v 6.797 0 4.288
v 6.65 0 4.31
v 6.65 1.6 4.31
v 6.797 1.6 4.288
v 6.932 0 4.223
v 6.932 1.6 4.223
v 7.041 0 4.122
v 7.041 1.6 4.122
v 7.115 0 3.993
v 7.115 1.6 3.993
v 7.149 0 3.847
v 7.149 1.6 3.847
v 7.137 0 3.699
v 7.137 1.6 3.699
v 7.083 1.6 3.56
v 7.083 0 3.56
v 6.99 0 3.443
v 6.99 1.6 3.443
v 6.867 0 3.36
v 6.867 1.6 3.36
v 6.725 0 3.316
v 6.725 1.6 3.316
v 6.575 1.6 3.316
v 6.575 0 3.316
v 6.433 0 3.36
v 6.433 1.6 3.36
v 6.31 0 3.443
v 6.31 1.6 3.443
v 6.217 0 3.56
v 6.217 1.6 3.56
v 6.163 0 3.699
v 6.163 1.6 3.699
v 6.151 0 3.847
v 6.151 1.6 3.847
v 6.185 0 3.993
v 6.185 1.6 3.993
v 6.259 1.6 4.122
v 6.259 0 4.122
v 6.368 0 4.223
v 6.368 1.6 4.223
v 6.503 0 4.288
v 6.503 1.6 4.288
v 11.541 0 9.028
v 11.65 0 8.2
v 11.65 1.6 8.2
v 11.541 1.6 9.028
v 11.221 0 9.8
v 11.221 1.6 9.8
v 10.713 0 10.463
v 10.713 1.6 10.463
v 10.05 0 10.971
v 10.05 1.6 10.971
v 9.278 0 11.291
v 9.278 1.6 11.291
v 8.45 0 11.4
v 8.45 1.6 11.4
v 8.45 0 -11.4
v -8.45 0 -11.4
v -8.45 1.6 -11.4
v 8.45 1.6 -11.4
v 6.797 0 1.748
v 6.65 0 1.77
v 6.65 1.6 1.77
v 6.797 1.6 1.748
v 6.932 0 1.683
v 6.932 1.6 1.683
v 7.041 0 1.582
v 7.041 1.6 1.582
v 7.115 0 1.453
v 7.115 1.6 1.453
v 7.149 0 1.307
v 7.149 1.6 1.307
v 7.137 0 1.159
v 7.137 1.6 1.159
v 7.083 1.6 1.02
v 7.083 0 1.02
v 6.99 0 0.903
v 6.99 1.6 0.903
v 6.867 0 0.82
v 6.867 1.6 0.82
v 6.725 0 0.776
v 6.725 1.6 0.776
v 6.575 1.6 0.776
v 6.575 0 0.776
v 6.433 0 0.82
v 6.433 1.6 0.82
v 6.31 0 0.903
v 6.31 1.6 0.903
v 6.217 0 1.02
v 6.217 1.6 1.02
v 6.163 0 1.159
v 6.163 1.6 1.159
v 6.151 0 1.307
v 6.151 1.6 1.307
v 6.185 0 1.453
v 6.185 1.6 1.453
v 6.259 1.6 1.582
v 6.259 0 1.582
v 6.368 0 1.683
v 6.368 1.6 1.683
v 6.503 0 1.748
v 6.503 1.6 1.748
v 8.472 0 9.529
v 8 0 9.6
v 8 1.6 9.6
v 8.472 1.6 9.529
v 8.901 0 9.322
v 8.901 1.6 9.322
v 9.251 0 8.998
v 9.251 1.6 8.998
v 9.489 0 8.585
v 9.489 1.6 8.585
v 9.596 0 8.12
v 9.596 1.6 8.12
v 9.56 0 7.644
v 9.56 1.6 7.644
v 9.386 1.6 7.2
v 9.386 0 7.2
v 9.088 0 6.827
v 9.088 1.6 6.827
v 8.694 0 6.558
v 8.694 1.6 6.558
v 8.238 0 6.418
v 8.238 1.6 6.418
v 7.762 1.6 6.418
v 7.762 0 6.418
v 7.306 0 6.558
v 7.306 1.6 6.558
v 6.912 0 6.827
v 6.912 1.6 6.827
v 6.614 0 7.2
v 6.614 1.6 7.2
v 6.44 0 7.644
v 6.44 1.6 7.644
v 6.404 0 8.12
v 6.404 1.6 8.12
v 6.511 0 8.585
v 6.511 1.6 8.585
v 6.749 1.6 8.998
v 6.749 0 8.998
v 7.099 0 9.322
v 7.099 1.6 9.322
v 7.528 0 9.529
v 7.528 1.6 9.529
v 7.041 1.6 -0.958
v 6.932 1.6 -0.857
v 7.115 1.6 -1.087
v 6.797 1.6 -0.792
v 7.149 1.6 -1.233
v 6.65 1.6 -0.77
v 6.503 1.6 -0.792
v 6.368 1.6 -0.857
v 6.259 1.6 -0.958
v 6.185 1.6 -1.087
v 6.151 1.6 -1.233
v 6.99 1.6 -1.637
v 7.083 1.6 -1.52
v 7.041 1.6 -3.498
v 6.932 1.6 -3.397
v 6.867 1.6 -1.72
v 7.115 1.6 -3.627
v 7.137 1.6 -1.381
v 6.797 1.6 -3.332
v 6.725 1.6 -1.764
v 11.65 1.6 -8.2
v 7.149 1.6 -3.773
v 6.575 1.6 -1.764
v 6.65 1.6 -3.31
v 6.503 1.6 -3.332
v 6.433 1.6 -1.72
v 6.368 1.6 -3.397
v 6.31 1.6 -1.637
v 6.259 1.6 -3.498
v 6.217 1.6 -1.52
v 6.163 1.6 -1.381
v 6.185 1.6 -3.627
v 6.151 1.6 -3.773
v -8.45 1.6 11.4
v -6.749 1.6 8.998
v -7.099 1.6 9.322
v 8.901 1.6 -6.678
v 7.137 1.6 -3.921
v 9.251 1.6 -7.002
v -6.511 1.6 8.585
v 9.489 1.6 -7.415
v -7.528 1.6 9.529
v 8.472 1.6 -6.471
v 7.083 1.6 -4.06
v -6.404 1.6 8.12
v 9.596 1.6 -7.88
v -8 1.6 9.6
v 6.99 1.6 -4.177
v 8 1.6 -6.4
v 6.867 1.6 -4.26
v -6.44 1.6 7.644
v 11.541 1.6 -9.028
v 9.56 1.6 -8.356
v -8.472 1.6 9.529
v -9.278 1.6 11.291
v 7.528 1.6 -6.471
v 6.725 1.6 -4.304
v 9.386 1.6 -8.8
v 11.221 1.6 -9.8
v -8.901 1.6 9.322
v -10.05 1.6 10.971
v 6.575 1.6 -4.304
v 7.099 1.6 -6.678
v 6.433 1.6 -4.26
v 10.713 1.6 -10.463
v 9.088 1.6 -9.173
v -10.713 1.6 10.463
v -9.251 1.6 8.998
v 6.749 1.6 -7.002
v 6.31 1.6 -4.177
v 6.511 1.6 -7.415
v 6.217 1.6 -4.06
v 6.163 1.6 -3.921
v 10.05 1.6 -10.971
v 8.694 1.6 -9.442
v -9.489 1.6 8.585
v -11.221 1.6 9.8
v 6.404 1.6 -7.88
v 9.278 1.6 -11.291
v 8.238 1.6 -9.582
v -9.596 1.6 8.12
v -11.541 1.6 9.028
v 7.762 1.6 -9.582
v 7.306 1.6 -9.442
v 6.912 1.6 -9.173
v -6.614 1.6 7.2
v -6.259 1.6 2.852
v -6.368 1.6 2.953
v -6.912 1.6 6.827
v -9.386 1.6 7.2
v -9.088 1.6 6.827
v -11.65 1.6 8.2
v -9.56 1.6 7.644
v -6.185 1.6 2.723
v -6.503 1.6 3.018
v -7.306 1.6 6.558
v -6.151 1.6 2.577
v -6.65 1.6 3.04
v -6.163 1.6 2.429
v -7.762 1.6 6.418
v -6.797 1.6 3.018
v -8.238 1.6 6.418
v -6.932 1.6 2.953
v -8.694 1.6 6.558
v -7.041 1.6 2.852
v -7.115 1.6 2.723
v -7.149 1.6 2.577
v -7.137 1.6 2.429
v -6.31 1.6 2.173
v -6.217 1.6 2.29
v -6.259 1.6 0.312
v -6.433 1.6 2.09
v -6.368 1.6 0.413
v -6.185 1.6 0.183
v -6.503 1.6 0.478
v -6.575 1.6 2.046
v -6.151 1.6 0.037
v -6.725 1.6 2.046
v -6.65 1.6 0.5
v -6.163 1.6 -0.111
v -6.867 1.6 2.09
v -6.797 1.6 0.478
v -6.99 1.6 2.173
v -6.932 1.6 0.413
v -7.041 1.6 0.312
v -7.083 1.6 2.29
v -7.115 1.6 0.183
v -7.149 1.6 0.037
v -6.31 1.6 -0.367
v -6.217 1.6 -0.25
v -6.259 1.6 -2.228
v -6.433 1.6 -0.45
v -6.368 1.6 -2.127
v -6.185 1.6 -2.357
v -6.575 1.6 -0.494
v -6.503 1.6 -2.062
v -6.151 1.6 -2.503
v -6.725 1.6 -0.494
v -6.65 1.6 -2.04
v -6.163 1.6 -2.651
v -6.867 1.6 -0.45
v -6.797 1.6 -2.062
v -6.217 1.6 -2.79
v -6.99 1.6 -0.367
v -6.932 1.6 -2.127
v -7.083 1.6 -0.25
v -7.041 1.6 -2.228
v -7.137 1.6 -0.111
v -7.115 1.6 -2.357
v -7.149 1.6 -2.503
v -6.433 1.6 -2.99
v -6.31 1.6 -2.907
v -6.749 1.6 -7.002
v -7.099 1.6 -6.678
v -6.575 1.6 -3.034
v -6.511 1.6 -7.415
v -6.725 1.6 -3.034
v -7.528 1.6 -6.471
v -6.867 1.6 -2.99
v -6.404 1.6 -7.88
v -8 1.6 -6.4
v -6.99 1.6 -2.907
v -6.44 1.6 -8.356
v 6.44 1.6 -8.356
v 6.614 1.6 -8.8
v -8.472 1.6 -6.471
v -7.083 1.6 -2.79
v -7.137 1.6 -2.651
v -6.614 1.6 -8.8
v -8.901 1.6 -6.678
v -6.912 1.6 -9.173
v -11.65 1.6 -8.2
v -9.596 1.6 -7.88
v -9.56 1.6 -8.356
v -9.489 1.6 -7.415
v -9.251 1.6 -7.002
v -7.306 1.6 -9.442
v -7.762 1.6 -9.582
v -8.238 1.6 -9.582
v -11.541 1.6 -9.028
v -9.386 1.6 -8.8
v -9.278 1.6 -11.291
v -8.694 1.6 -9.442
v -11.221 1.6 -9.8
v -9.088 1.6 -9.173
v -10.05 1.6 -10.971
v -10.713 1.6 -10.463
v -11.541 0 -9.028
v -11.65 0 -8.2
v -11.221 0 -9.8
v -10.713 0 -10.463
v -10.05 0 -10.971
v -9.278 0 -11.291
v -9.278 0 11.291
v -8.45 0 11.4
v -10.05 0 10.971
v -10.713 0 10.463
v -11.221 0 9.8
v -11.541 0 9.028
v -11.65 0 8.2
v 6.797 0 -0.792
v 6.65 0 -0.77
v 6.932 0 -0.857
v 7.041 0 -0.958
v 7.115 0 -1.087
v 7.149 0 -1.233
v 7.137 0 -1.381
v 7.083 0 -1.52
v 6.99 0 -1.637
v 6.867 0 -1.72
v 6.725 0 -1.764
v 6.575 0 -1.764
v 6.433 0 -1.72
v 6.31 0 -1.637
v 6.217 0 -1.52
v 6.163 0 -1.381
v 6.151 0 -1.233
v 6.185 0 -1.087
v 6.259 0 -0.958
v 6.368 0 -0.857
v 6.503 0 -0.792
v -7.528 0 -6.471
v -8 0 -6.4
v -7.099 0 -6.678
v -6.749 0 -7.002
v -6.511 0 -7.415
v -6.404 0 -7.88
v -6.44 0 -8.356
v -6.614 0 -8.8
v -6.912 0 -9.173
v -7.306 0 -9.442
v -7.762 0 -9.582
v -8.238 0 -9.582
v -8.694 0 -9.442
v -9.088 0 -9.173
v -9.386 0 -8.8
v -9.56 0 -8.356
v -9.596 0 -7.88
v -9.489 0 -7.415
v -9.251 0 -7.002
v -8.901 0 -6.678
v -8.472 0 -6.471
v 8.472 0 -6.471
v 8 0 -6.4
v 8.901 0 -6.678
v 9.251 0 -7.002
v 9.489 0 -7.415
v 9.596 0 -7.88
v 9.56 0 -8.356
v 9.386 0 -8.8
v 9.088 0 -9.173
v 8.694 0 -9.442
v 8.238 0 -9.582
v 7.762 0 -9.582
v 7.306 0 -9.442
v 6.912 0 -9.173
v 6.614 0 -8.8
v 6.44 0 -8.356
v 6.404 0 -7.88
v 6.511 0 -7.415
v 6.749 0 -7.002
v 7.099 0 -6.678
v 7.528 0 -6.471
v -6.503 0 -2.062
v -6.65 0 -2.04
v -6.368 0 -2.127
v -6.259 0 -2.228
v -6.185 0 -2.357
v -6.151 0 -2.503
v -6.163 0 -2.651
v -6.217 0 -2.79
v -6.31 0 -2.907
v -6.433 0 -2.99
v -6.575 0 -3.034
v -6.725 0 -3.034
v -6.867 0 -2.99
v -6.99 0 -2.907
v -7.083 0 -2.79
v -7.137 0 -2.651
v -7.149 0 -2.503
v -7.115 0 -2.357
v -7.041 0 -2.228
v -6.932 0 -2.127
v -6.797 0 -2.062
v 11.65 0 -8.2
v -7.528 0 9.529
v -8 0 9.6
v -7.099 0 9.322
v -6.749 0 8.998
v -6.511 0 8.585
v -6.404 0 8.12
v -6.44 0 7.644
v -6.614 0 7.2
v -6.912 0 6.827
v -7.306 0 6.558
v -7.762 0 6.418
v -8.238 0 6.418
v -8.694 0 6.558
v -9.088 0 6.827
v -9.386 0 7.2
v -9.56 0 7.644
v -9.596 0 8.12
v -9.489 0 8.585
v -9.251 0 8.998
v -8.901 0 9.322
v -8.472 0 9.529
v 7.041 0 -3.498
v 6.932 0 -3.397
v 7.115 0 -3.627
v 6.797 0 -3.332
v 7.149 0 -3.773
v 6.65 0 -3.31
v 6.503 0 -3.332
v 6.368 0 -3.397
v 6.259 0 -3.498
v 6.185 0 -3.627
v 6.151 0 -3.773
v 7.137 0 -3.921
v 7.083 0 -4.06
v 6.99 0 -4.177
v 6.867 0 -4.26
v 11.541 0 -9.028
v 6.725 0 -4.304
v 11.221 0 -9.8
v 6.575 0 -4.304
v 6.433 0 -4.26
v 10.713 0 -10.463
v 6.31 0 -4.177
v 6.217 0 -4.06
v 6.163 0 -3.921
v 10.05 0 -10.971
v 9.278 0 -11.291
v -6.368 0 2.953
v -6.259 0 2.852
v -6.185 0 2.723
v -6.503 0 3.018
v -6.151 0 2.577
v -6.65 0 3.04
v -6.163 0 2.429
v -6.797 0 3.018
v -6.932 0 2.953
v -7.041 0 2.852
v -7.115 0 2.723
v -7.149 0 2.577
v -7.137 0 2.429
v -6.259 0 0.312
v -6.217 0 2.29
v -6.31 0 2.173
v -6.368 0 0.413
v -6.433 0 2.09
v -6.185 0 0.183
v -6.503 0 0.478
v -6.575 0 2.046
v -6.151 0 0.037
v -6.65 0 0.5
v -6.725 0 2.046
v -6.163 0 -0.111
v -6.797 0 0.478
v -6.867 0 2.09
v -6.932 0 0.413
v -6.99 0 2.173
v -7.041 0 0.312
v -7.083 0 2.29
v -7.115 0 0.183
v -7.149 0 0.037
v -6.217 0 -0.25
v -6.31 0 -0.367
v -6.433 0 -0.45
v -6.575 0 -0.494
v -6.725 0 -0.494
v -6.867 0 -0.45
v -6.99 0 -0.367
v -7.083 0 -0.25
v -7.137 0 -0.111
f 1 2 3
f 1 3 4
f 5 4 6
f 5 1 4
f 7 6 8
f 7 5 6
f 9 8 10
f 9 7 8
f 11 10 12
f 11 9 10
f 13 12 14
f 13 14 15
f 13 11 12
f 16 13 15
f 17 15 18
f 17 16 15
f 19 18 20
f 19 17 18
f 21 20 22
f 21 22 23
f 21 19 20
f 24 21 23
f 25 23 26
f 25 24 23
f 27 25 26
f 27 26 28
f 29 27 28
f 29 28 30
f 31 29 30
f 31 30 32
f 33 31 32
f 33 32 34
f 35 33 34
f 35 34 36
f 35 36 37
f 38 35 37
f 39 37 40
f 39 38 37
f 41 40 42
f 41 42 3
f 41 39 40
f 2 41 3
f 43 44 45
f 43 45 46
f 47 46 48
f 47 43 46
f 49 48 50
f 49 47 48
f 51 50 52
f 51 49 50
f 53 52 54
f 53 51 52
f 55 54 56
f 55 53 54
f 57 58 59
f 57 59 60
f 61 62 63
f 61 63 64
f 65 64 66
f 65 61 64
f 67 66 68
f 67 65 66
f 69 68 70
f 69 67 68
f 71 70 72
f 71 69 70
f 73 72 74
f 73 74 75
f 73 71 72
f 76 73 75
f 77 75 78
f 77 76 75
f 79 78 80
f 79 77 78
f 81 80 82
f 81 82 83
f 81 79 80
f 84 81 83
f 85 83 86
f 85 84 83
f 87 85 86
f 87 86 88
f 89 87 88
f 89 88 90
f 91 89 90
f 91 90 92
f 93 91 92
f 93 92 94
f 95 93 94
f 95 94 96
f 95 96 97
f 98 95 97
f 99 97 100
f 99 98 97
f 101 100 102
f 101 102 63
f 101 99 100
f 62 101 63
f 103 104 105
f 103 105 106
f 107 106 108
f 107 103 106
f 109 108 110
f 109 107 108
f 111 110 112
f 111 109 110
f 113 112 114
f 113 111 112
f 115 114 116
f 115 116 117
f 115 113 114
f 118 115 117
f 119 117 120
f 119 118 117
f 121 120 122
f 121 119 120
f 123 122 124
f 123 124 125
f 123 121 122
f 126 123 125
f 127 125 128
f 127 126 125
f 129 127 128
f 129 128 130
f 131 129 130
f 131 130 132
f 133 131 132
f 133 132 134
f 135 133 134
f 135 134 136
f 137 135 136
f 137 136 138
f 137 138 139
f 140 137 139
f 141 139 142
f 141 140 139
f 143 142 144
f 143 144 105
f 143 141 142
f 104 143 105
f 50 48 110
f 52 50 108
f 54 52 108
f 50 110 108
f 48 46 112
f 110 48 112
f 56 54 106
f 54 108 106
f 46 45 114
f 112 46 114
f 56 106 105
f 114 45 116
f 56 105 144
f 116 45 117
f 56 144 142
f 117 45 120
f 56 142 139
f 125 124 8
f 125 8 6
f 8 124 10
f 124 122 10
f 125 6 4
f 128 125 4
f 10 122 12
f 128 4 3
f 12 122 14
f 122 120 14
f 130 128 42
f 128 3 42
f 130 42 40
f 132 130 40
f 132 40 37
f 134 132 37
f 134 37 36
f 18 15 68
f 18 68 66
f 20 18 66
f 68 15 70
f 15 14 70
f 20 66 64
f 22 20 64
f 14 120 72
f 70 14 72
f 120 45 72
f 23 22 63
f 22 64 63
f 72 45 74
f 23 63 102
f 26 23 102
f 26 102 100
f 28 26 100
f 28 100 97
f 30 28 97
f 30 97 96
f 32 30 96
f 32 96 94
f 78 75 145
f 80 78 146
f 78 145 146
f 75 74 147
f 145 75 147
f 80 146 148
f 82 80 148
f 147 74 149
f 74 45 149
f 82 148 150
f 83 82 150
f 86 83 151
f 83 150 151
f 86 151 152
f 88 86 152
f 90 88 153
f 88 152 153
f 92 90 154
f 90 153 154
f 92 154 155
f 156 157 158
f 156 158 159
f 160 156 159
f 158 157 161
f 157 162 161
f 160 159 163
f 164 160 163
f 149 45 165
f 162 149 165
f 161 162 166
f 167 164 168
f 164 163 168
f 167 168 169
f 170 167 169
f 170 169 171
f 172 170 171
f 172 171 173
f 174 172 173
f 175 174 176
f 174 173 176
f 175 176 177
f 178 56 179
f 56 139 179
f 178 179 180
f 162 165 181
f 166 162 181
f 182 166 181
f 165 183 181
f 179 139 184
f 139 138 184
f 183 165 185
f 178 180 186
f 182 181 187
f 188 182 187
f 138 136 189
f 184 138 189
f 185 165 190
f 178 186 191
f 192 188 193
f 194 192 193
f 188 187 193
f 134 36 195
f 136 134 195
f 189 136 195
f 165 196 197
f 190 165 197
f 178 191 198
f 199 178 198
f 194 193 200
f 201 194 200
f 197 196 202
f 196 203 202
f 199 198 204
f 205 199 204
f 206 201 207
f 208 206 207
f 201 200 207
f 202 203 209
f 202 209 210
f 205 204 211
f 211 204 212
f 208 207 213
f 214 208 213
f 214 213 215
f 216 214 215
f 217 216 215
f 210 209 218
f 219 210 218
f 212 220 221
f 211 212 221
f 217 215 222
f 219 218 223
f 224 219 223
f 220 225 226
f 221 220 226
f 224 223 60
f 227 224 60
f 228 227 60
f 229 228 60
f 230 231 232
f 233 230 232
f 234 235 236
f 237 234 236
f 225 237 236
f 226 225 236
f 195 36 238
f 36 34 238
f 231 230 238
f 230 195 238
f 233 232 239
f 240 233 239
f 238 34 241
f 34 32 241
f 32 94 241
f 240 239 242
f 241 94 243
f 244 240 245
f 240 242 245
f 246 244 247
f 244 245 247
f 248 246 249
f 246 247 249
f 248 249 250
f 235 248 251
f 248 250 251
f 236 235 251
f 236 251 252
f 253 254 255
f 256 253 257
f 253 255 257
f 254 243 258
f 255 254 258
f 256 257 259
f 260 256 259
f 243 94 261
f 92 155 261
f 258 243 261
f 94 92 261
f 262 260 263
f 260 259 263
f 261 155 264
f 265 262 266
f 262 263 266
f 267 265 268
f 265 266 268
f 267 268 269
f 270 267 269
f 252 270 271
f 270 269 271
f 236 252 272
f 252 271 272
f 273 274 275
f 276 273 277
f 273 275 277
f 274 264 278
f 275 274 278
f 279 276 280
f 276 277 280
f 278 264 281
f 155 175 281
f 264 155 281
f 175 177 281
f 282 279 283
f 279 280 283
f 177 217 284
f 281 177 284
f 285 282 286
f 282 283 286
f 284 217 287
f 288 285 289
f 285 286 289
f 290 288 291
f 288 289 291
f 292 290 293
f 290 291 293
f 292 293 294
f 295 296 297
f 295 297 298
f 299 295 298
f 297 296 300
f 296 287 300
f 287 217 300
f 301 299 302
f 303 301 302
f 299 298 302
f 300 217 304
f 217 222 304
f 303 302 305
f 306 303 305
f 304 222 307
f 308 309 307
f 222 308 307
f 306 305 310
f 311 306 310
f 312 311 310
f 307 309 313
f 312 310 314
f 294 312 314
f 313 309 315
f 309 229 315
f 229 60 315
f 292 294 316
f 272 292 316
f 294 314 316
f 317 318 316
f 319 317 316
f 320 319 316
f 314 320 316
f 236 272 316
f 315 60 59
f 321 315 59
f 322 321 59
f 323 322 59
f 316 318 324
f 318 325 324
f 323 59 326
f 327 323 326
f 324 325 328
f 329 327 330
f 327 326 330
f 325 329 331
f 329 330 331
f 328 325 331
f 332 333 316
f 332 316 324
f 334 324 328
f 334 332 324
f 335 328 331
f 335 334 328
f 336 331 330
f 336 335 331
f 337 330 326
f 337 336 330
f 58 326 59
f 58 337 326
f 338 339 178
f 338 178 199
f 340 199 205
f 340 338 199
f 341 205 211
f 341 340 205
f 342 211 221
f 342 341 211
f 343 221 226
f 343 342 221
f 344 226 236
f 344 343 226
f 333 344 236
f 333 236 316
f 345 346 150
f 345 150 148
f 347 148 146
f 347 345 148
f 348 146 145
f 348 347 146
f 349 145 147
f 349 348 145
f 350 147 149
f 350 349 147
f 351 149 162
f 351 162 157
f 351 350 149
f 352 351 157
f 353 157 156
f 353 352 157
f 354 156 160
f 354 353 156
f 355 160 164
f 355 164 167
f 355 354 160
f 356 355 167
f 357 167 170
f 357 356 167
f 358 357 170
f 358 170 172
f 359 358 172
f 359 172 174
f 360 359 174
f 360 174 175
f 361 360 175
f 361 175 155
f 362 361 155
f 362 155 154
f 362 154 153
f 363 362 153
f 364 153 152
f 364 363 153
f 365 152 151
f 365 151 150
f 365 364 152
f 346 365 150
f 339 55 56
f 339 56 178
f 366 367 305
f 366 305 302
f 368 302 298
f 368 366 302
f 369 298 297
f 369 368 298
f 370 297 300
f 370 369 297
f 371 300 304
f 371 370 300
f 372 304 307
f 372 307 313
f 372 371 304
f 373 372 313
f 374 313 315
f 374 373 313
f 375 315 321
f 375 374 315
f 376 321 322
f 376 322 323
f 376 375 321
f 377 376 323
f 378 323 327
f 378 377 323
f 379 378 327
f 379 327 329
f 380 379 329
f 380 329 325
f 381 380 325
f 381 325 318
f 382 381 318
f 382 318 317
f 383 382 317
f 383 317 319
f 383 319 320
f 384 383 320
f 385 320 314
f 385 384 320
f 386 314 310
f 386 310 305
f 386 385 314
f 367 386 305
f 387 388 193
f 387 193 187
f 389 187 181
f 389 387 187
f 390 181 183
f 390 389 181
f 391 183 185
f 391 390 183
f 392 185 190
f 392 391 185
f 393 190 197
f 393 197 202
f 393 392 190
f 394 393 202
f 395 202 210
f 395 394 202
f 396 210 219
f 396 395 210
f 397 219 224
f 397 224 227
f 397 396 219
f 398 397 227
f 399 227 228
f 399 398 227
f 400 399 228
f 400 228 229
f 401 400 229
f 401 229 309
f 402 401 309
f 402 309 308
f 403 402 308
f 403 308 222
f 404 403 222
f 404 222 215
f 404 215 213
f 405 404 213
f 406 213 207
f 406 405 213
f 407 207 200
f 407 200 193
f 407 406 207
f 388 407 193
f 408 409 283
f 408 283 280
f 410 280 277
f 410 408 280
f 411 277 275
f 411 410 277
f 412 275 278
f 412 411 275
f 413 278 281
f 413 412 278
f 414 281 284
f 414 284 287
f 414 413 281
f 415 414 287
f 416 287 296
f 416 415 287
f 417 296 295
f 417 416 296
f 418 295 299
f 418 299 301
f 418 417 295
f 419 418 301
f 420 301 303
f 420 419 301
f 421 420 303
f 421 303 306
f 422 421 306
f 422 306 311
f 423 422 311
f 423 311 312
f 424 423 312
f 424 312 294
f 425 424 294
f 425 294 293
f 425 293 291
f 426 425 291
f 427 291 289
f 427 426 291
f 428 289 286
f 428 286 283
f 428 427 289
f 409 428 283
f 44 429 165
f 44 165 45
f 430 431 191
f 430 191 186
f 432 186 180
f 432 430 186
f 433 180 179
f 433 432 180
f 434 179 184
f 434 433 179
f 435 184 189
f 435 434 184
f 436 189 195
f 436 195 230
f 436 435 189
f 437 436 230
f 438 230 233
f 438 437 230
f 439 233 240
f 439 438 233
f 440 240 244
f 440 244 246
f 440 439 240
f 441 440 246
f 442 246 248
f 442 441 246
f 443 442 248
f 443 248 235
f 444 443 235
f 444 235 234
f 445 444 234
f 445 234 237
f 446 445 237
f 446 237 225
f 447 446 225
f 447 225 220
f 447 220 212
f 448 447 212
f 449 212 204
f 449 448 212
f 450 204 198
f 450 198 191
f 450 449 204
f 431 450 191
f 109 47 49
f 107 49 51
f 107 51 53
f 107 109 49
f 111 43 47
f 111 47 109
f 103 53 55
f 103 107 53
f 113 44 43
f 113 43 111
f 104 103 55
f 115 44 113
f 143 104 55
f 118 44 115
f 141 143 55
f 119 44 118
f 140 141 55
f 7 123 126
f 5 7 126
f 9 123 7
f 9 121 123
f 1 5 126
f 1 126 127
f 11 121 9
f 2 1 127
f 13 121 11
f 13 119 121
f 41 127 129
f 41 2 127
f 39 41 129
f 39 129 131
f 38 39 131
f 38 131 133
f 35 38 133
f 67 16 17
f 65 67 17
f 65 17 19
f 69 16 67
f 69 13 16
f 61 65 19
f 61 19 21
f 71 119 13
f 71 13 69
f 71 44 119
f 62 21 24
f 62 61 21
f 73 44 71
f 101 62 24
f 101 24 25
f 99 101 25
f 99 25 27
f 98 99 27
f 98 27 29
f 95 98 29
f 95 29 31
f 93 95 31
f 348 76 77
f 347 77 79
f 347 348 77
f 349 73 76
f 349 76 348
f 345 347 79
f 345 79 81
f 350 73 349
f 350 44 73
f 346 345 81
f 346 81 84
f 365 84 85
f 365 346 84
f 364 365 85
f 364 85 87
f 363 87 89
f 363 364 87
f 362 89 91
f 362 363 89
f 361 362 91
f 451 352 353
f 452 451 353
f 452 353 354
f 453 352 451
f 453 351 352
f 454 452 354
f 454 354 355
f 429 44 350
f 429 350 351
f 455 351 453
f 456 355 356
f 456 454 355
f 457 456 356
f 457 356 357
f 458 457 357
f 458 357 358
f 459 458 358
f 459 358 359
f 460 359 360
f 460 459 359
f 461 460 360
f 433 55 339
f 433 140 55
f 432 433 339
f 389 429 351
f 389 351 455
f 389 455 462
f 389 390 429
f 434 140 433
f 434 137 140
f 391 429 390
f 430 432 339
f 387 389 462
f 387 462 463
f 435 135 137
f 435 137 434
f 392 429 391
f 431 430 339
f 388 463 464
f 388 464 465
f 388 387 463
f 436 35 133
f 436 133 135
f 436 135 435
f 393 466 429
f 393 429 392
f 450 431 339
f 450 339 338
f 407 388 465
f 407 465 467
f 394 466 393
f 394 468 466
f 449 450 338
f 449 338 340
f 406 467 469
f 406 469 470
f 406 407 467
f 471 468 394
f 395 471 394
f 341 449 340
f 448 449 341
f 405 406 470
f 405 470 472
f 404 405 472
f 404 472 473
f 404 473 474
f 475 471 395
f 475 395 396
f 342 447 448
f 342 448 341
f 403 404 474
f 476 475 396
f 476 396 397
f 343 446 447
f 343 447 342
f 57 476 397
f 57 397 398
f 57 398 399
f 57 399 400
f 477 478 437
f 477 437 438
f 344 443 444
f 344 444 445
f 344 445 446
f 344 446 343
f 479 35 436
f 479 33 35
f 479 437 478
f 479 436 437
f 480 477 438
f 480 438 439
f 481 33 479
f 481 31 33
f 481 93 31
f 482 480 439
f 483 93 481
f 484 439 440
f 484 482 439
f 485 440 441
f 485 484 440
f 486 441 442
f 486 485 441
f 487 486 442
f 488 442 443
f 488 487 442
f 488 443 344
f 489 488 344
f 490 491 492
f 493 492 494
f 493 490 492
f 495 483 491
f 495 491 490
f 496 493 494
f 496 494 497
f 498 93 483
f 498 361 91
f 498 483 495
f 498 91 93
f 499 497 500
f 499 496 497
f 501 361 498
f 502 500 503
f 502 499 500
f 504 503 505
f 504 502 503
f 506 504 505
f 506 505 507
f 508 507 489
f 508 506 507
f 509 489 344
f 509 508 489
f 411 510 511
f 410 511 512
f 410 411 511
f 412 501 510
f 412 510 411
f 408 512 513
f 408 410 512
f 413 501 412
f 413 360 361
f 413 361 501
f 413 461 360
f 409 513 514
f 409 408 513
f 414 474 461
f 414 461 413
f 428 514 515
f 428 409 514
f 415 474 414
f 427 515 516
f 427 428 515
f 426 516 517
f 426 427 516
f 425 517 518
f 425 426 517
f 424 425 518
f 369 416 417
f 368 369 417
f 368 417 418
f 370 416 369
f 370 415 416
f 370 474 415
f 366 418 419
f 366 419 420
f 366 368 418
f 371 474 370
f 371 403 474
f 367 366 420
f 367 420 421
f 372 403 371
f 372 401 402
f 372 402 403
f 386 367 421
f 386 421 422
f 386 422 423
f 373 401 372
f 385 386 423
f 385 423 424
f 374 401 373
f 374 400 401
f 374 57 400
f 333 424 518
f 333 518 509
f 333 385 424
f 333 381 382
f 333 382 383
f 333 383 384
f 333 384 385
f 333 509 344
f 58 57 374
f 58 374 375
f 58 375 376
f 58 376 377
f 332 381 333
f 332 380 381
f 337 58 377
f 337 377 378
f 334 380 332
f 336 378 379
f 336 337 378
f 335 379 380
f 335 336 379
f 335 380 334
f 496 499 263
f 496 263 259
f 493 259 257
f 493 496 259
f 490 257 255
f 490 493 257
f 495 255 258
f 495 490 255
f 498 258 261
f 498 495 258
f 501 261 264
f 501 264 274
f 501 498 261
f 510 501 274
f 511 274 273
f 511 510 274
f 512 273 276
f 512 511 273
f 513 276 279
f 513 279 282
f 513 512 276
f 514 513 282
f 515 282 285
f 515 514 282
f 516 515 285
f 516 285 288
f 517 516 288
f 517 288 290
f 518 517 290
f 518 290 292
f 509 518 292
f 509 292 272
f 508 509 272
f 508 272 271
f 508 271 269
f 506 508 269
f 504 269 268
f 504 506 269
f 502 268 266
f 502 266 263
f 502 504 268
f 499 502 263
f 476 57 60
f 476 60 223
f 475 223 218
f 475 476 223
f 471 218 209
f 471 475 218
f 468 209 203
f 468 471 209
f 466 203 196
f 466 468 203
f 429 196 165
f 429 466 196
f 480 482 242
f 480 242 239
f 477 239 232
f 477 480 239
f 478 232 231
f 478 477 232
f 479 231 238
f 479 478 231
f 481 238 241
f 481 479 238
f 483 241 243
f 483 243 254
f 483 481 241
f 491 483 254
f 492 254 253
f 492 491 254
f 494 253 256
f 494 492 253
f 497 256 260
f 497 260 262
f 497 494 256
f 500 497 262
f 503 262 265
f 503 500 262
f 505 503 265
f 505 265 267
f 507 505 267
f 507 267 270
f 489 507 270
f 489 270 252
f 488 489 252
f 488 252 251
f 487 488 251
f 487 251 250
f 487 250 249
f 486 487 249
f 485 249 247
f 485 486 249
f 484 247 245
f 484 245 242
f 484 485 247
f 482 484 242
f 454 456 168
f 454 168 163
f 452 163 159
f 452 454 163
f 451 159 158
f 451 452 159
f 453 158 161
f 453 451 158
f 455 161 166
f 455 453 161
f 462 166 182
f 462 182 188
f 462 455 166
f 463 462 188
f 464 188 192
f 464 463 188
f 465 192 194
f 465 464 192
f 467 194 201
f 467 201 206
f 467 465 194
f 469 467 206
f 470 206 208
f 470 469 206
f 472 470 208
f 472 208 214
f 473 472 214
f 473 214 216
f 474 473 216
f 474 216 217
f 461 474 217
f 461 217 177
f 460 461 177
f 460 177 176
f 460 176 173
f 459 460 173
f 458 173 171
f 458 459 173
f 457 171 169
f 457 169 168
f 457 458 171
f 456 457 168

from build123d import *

# Parameters (mm, degrees)
SKETCH_1_R      = 1.6
SKETCH_1_R_2    = 0.5
EXTRUDE_1_DEPTH = 1.6


with BuildPart() as part:
    # Эскиз1 → Бобышка-Вытянуть1 (new body)
    with BuildSketch(Plane(origin=(0, 0, 0), x_dir=(1, 0, 0), z_dir=(0, 1, 0))):
        with BuildLine():
            Line((-8.45, 11.4), (8.45, 11.4))
            ThreePointArc((8.45, 11.4), (10.7127417, 10.4627417), (11.65, 8.2))
            Line((11.65, 8.2), (11.65, -8.2))
            ThreePointArc((11.65, -8.2), (10.7127417, -10.4627417), (8.45, -11.4))
            Line((8.45, -11.4), (-8.45, -11.4))
            ThreePointArc((-8.45, -11.4), (-10.7127417, -10.4627417), (-11.65, -8.2))
            Line((-11.65, -8.2), (-11.65, 8.2))
            ThreePointArc((-11.65, 8.2), (-10.7127417, 10.4627417), (-8.45, 11.4))
        make_face()
        with Locations(Location((-8, 8, 0), (0, 0, 270))):
            Circle(SKETCH_1_R, mode=Mode.SUBTRACT)
        with Locations(Location((8, 8, 0), (0, 0, 270))):
            Circle(SKETCH_1_R, mode=Mode.SUBTRACT)
        with Locations(Location((8, -8, 0), (0, 0, 270))):
            Circle(SKETCH_1_R, mode=Mode.SUBTRACT)
        with Locations(Location((-8, -8, 0), (0, 0, 270))):
            Circle(SKETCH_1_R, mode=Mode.SUBTRACT)
        with Locations(Location((-6.65, 0, 0), (0, 0, 270))):
            Circle(SKETCH_1_R_2, mode=Mode.SUBTRACT)
        with Locations(Location((-6.65, -2.54, 0), (0, 0, 270))):
            Circle(SKETCH_1_R_2, mode=Mode.SUBTRACT)
        with Locations(Location((-6.65, 2.54, 0), (0, 0, 270))):
            Circle(SKETCH_1_R_2, mode=Mode.SUBTRACT)
        with Locations(Location((6.65, 3.81, 0), (0, 0, 270))):
            Circle(SKETCH_1_R_2, mode=Mode.SUBTRACT)
        with Locations(Location((6.65, 1.27, 0), (0, 0, 270))):
            Circle(SKETCH_1_R_2, mode=Mode.SUBTRACT)
        with Locations(Location((6.65, -1.27, 0), (0, 0, 270))):
            Circle(SKETCH_1_R_2, mode=Mode.SUBTRACT)
        with Locations(Location((6.65, -3.81, 0), (0, 0, 270))):
            Circle(SKETCH_1_R_2, mode=Mode.SUBTRACT)
    extrude(amount=EXTRUDE_1_DEPTH)


solid = part.part
